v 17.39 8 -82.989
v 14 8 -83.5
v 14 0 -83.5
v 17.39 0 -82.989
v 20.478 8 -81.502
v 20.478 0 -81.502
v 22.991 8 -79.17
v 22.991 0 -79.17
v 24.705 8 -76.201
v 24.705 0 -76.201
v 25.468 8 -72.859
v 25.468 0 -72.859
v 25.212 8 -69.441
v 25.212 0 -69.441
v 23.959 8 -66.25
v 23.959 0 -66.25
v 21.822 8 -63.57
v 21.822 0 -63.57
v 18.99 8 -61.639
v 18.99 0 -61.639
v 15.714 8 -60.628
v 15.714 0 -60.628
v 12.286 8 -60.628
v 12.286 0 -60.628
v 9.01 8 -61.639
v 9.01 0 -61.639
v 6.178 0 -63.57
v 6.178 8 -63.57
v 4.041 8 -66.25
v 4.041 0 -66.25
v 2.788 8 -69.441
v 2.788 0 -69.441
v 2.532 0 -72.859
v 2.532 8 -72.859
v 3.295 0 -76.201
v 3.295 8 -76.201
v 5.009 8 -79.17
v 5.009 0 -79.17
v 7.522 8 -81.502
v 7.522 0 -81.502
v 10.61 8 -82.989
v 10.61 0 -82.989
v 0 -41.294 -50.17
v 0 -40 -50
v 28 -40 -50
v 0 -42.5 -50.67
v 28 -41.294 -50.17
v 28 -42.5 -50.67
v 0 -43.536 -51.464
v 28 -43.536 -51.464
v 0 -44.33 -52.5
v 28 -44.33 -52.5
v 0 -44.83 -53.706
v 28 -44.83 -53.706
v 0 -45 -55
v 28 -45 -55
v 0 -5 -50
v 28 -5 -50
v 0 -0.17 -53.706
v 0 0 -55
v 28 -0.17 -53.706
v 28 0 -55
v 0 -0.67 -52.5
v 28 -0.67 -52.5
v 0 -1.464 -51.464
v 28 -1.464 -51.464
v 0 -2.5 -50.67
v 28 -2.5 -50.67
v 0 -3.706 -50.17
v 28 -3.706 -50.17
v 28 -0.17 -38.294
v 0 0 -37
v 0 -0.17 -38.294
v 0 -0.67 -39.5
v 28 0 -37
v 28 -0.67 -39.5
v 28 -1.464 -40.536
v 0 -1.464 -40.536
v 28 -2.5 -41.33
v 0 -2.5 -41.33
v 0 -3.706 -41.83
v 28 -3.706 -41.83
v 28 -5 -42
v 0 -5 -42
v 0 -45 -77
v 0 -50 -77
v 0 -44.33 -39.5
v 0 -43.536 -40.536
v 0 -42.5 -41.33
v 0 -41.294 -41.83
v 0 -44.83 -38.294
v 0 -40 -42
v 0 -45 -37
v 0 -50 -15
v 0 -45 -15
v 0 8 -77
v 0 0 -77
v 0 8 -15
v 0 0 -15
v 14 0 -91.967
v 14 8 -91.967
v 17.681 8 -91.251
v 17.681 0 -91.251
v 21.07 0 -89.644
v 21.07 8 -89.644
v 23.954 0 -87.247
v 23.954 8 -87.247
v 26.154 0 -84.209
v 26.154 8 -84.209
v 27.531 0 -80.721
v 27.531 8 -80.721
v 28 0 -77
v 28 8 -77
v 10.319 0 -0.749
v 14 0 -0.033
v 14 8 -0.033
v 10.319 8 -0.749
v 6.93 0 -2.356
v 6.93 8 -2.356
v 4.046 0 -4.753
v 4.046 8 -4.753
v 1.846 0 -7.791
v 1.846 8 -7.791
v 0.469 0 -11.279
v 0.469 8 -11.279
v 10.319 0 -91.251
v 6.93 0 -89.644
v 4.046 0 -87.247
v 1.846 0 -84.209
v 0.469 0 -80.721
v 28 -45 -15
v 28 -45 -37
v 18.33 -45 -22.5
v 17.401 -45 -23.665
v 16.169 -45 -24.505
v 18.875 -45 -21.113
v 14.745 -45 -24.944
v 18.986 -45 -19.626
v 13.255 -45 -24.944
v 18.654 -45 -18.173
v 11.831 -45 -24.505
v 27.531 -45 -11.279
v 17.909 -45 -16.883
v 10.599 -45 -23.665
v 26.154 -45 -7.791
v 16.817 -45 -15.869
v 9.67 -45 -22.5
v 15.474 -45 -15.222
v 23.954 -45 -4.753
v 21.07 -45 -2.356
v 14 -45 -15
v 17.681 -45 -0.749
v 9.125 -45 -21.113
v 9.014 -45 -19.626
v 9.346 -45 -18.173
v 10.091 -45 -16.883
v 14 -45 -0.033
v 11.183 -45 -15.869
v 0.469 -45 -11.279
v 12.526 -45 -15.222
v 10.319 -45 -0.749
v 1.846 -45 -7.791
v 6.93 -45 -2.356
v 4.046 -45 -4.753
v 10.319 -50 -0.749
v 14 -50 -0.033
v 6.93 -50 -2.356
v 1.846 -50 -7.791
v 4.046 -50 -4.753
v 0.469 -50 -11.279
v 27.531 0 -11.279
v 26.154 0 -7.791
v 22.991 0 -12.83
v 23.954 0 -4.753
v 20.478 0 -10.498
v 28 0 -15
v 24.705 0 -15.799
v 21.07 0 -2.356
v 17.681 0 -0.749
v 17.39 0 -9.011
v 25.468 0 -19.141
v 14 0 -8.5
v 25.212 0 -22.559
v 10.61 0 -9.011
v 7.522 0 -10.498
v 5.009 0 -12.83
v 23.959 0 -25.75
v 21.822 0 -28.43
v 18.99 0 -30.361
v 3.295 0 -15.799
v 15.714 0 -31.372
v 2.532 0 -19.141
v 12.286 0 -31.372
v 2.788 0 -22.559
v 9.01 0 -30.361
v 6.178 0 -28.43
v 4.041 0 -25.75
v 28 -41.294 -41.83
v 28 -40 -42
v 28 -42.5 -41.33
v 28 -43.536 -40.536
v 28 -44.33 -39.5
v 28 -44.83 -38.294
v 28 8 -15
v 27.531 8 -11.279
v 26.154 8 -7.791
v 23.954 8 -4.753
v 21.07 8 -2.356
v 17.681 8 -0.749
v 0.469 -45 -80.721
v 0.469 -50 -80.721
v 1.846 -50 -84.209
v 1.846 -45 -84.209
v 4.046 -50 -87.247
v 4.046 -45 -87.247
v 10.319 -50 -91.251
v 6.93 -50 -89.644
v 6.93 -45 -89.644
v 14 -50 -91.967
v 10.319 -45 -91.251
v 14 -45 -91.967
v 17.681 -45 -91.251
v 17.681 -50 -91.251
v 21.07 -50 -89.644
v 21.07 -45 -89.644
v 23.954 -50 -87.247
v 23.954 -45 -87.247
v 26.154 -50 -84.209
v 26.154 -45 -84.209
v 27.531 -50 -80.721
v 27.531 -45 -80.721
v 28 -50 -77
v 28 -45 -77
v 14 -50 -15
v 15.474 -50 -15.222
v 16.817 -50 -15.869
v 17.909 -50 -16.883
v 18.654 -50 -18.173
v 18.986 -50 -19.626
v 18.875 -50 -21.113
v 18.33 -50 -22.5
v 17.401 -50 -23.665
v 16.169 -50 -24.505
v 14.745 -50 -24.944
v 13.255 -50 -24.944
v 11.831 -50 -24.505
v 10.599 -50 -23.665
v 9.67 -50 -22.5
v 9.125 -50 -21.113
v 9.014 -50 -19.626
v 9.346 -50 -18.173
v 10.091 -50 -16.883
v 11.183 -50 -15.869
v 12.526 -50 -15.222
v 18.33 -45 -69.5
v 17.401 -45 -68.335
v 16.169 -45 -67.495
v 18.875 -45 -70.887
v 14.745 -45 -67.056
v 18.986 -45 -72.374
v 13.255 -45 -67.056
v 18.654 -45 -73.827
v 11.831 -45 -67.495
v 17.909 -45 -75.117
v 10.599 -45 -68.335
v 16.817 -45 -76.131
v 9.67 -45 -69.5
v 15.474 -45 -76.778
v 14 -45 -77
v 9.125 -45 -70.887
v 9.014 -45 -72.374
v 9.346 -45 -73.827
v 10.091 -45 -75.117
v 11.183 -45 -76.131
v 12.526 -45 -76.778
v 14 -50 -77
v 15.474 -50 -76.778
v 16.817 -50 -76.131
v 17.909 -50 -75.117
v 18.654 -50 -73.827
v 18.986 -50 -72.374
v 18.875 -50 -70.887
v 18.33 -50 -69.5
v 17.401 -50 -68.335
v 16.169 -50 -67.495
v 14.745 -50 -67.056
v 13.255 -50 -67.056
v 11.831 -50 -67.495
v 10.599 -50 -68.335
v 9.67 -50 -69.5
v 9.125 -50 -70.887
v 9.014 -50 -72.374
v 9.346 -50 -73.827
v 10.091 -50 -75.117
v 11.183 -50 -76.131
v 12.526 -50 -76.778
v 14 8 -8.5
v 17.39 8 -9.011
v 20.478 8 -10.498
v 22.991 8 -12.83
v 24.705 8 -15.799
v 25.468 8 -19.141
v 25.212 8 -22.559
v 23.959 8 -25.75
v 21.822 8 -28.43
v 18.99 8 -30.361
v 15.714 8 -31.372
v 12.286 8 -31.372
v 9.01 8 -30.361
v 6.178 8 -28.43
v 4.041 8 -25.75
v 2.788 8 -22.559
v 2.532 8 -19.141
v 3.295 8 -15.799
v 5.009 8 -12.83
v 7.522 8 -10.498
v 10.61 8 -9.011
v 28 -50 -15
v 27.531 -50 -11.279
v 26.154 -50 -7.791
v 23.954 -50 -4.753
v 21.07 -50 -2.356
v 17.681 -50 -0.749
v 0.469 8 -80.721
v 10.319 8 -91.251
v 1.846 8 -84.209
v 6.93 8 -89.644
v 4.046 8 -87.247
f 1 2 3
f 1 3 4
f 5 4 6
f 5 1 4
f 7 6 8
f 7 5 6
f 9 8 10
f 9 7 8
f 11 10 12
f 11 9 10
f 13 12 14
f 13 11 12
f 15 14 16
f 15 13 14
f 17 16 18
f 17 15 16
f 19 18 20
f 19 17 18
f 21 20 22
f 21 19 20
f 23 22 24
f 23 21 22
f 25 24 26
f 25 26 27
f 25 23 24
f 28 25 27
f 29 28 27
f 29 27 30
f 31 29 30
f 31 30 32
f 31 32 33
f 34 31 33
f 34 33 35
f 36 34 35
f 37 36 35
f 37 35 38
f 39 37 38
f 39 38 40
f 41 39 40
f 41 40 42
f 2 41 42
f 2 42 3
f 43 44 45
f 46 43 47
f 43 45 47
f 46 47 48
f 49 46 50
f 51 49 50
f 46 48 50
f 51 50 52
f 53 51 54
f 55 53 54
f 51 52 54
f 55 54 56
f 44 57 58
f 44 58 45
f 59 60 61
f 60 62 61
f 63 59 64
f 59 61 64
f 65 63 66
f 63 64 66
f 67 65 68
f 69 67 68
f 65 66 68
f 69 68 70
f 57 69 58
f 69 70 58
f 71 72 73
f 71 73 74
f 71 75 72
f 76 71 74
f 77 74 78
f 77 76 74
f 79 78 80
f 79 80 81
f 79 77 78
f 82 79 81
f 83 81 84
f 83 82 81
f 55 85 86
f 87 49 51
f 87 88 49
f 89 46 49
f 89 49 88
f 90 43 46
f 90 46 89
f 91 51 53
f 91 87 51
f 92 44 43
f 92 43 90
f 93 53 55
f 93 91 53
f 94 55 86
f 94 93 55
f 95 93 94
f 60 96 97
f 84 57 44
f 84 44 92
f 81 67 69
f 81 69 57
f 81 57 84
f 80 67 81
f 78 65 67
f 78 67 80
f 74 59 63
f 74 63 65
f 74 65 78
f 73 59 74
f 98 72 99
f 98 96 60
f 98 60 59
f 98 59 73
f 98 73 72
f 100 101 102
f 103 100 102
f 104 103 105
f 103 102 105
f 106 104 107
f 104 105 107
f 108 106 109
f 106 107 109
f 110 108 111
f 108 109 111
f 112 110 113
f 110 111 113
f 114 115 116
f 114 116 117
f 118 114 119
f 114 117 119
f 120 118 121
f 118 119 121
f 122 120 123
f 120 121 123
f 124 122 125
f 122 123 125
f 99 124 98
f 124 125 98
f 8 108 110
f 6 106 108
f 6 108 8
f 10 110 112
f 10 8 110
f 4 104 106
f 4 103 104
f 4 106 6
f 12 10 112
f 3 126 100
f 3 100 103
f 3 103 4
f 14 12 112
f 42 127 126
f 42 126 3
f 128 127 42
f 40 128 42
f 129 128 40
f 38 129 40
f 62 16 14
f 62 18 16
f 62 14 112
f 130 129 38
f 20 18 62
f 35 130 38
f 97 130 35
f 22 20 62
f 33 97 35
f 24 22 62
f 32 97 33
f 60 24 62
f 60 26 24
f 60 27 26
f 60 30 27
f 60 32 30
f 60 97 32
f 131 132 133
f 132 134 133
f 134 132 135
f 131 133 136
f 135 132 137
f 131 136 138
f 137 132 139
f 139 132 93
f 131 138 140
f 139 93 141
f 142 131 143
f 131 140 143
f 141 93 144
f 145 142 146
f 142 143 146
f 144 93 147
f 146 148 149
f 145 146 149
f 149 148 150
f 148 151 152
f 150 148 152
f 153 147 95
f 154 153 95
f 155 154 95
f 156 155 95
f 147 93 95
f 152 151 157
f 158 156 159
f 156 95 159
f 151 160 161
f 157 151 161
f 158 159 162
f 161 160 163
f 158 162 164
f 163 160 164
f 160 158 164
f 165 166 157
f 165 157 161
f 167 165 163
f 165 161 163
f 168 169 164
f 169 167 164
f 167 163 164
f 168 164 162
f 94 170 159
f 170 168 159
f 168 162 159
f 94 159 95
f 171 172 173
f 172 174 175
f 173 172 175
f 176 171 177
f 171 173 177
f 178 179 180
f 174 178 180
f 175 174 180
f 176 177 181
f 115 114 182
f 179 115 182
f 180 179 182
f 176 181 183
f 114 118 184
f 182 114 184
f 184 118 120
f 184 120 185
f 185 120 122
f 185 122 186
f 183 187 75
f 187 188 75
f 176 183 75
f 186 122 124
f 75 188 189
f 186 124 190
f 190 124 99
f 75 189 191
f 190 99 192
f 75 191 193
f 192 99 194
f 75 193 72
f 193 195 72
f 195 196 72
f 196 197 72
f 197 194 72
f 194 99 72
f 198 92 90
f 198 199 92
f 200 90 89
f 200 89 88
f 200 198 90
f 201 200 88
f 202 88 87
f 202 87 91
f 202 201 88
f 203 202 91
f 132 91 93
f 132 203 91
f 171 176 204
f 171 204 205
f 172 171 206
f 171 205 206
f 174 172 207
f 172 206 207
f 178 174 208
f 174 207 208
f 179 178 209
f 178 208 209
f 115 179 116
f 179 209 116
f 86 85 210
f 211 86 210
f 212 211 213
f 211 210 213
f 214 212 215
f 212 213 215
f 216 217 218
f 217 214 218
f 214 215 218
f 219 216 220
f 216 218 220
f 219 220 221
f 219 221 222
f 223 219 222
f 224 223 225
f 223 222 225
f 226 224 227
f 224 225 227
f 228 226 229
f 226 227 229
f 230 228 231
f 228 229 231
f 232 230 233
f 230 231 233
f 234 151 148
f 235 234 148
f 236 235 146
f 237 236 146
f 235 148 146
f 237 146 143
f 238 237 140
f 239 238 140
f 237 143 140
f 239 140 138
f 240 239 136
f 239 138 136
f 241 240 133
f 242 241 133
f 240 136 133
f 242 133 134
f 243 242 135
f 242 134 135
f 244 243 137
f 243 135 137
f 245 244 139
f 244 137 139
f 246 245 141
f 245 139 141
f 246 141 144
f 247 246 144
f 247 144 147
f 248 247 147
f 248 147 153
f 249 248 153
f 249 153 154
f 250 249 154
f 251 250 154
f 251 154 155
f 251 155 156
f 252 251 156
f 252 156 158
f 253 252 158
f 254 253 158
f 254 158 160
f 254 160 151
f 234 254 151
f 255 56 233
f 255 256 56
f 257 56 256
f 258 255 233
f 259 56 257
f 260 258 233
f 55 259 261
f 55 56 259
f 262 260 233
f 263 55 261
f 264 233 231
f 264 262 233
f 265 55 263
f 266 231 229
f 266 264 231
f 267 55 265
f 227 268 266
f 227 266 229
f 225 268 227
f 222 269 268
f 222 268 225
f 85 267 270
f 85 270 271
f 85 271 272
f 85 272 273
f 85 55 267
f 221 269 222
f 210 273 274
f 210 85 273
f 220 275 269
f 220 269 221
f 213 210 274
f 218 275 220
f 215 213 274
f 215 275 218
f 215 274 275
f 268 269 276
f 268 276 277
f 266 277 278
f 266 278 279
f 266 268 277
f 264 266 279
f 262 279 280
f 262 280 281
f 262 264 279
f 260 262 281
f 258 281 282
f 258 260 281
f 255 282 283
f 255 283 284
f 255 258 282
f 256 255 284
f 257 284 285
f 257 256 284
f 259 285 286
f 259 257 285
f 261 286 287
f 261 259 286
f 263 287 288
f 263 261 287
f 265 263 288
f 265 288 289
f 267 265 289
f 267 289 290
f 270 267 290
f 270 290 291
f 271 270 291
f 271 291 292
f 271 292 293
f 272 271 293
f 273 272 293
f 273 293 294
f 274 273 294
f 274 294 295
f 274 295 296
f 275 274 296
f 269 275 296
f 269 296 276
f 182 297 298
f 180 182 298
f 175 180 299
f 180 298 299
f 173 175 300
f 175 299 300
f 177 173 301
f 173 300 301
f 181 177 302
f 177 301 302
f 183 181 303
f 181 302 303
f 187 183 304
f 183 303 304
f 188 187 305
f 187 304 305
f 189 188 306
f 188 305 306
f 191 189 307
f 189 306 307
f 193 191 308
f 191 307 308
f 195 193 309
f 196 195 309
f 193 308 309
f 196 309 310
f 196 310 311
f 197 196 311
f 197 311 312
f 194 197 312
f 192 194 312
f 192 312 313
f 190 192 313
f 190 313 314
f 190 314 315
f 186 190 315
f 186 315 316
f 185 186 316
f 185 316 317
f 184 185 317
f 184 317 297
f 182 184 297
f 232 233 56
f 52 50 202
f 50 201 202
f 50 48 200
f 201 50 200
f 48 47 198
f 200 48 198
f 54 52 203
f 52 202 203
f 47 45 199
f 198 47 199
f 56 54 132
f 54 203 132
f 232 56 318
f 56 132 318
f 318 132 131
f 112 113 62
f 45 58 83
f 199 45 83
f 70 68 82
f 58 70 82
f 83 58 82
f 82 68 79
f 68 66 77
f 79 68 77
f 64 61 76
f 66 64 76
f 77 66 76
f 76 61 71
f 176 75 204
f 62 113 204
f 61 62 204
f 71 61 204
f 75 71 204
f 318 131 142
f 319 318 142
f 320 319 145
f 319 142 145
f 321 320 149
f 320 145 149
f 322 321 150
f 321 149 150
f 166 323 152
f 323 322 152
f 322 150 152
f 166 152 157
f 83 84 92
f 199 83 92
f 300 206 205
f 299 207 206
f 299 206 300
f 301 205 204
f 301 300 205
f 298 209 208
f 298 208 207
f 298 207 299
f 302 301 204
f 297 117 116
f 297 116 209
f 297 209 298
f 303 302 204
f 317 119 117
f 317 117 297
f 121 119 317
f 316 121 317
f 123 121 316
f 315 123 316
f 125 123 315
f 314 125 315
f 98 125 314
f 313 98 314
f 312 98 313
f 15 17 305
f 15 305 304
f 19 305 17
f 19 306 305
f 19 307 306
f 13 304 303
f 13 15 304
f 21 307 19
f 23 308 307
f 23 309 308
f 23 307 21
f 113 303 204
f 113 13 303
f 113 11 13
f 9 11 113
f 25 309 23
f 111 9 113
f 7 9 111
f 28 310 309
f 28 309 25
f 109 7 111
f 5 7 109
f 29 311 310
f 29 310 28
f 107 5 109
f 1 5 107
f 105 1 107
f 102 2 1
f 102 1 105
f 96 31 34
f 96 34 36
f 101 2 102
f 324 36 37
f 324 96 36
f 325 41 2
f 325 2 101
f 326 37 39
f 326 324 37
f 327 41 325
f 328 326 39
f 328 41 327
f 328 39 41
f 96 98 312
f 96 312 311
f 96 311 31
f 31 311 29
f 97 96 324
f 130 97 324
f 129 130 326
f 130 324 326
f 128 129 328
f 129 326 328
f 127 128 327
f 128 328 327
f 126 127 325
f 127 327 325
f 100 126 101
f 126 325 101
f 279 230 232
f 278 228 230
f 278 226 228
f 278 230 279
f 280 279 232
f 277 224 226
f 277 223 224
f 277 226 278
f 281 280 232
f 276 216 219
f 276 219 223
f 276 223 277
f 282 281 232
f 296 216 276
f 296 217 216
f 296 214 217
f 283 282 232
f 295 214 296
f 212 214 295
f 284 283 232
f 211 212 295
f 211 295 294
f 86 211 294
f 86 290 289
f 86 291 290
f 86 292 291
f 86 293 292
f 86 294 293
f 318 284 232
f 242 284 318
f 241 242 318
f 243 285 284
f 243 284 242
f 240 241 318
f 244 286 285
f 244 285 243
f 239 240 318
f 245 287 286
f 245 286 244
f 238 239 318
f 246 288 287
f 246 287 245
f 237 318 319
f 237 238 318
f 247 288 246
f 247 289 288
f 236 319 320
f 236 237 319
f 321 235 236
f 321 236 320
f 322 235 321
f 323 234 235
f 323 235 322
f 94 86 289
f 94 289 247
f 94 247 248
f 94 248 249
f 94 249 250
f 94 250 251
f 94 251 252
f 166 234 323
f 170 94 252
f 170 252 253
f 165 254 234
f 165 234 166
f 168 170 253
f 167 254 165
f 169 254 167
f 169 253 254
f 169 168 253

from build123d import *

# Parameters (mm, degrees)
BOSS_EXTRUDE1_DEPTH  = 28
CUT_EXTRUDE1_REACH   = 81.145
SKETCH2_R            = 11.5
CUT_EXTRUDE2_REACH   = 77.558
SKETCH3_R            = 5
FILLET2_R            = 5
FILLET2_OF_MIRROR2_R = 5
FILLET3_R            = 15


with BuildPart() as part:
    # Sketch1 → Boss-Extrude1 (new body)
    with BuildSketch(Plane(origin=(0, 0, 0), x_dir=(0, 0, -1), z_dir=(1, 0, 0))):
        Polygon((0, 0), (42, 0), (42, -45), (0, -45), (0, -50), (46, -50), (46, 8), (0, 8), align=None)
    boss_extrude1 = extrude(amount=BOSS_EXTRUDE1_DEPTH)

    # Sketch2 → Cut-Extrude1 (cut, up to next)
    with BuildSketch(Plane(origin=(0, 8, 0), x_dir=(1, 0, 0), z_dir=(0, 1, 0)), mode=Mode.PRIVATE) as cut_extrude1_sk1:
        with Locations(Location((14, 20, 0), (0, 0, 270))):
            Circle(SKETCH2_R)
    cut_extrude1_tool1 = extrude(cut_extrude1_sk1.sketch, amount=-CUT_EXTRUDE1_REACH, mode=Mode.PRIVATE) & part.part
    cut_extrude1 = cut_extrude1_tool1.solids().sort_by_distance((14, 8, -20))[0]
    add(cut_extrude1, mode=Mode.SUBTRACT)

    # Sketch3 → Cut-Extrude2 (cut, up to next)
    with BuildSketch(Plane(origin=(0, -45, 0), x_dir=(1, 0, 0), z_dir=(0, 1, 0)), mode=Mode.PRIVATE) as cut_extrude2_sk1:
        with Locations(Location((14, 20, 0), (0, 0, 270))):
            Circle(SKETCH3_R)
    cut_extrude2_tool1 = extrude(cut_extrude2_sk1.sketch, amount=-CUT_EXTRUDE2_REACH, mode=Mode.PRIVATE) & part.part
    cut_extrude2 = cut_extrude2_tool1.solids().sort_by_distance((14, -45, -20))[0]
    add(cut_extrude2, mode=Mode.SUBTRACT)

    # Fillet2
    fillet2_edges = [part.edges().sort_by_distance(p)[0] for p in [
        (14, -45, -42),
        (14, 0, -42),
    ]]
    fillet(fillet2_edges, radius=FILLET2_R)

    # Mirror2: Boss-Extrude1, Cut-Extrude1, Cut-Extrude2 across plane
    add(boss_extrude1.mirror(Plane(origin=(28, -50, -46), x_dir=(1, 0, 0), z_dir=(0, 0, 1))))
    add(cut_extrude1.mirror(Plane(origin=(28, -50, -46), x_dir=(1, 0, 0), z_dir=(0, 0, 1))), mode=Mode.SUBTRACT)
    add(cut_extrude2.mirror(Plane(origin=(28, -50, -46), x_dir=(1, 0, 0), z_dir=(0, 0, 1))), mode=Mode.SUBTRACT)

    # Fillet2 of Mirror2
    fillet2_of_mirror2_edges = [part.edges().sort_by_distance(p)[0] for p in [
        (14, -45, -50),
        (14, 0, -50),
    ]]
    fillet(fillet2_of_mirror2_edges, radius=FILLET2_OF_MIRROR2_R)

    # Fillet3
    # the kernel refuses this fillet: 15 mm, written as the material it takes off along each edge
    with BuildSketch(Plane(origin=(0, -7.5, 0), x_dir=(0, 0, -1), z_dir=(0, -1, 0)), Plane(origin=(28, -7.5, 0), x_dir=(-1, 0, 0), z_dir=(0, -1, 0))) as fillet3_piece_1:
        with BuildLine():
            CenterArc((FILLET3_R, FILLET3_R), FILLET3_R, 180, 90)
            Line((0, FILLET3_R), (0, 0))
            Line((0, 0), (FILLET3_R, 0))
        make_face()
    extrude(amount=80, mode=Mode.SUBTRACT)
    with BuildSketch(Plane(origin=(0, 45.5, 0), x_dir=(0, 0, -1), z_dir=(0, -1, 0)), Plane(origin=(28, 45.5, 0), x_dir=(-1, 0, 0), z_dir=(0, -1, 0))) as fillet3_piece_2:
        with BuildLine():
            CenterArc((FILLET3_R, FILLET3_R), FILLET3_R, 180, 90)
            Line((0, FILLET3_R), (0, 0))
            Line((0, 0), (FILLET3_R, 0))
        make_face()
    extrude(amount=83, mode=Mode.SUBTRACT)
    with BuildSketch(Plane(origin=(0, 45.5, -92), x_dir=(0, 0, 1), z_dir=(0, -1, 0)), Plane(origin=(28, 45.5, -92), x_dir=(-1, 0, 0), z_dir=(0, -1, 0))) as fillet3_piece_3:
        with BuildLine():
            CenterArc((FILLET3_R, -FILLET3_R), FILLET3_R, 90, 90)
            Line((0, -FILLET3_R), (0, 0))
            Line((0, 0), (FILLET3_R, 0))
        make_face()
    extrude(amount=83, mode=Mode.SUBTRACT)
    with BuildSketch(Plane(origin=(0, -7.5, -92), x_dir=(0, 0, 1), z_dir=(0, -1, 0)), Plane(origin=(28, -7.5, -92), x_dir=(-1, 0, 0), z_dir=(0, -1, 0))) as fillet3_piece_4:
        with BuildLine():
            CenterArc((FILLET3_R, -FILLET3_R), FILLET3_R, 90, 90)
            Line((0, -FILLET3_R), (0, 0))
            Line((0, 0), (FILLET3_R, 0))
        make_face()
    extrude(amount=80, mode=Mode.SUBTRACT)


solid = part.part
